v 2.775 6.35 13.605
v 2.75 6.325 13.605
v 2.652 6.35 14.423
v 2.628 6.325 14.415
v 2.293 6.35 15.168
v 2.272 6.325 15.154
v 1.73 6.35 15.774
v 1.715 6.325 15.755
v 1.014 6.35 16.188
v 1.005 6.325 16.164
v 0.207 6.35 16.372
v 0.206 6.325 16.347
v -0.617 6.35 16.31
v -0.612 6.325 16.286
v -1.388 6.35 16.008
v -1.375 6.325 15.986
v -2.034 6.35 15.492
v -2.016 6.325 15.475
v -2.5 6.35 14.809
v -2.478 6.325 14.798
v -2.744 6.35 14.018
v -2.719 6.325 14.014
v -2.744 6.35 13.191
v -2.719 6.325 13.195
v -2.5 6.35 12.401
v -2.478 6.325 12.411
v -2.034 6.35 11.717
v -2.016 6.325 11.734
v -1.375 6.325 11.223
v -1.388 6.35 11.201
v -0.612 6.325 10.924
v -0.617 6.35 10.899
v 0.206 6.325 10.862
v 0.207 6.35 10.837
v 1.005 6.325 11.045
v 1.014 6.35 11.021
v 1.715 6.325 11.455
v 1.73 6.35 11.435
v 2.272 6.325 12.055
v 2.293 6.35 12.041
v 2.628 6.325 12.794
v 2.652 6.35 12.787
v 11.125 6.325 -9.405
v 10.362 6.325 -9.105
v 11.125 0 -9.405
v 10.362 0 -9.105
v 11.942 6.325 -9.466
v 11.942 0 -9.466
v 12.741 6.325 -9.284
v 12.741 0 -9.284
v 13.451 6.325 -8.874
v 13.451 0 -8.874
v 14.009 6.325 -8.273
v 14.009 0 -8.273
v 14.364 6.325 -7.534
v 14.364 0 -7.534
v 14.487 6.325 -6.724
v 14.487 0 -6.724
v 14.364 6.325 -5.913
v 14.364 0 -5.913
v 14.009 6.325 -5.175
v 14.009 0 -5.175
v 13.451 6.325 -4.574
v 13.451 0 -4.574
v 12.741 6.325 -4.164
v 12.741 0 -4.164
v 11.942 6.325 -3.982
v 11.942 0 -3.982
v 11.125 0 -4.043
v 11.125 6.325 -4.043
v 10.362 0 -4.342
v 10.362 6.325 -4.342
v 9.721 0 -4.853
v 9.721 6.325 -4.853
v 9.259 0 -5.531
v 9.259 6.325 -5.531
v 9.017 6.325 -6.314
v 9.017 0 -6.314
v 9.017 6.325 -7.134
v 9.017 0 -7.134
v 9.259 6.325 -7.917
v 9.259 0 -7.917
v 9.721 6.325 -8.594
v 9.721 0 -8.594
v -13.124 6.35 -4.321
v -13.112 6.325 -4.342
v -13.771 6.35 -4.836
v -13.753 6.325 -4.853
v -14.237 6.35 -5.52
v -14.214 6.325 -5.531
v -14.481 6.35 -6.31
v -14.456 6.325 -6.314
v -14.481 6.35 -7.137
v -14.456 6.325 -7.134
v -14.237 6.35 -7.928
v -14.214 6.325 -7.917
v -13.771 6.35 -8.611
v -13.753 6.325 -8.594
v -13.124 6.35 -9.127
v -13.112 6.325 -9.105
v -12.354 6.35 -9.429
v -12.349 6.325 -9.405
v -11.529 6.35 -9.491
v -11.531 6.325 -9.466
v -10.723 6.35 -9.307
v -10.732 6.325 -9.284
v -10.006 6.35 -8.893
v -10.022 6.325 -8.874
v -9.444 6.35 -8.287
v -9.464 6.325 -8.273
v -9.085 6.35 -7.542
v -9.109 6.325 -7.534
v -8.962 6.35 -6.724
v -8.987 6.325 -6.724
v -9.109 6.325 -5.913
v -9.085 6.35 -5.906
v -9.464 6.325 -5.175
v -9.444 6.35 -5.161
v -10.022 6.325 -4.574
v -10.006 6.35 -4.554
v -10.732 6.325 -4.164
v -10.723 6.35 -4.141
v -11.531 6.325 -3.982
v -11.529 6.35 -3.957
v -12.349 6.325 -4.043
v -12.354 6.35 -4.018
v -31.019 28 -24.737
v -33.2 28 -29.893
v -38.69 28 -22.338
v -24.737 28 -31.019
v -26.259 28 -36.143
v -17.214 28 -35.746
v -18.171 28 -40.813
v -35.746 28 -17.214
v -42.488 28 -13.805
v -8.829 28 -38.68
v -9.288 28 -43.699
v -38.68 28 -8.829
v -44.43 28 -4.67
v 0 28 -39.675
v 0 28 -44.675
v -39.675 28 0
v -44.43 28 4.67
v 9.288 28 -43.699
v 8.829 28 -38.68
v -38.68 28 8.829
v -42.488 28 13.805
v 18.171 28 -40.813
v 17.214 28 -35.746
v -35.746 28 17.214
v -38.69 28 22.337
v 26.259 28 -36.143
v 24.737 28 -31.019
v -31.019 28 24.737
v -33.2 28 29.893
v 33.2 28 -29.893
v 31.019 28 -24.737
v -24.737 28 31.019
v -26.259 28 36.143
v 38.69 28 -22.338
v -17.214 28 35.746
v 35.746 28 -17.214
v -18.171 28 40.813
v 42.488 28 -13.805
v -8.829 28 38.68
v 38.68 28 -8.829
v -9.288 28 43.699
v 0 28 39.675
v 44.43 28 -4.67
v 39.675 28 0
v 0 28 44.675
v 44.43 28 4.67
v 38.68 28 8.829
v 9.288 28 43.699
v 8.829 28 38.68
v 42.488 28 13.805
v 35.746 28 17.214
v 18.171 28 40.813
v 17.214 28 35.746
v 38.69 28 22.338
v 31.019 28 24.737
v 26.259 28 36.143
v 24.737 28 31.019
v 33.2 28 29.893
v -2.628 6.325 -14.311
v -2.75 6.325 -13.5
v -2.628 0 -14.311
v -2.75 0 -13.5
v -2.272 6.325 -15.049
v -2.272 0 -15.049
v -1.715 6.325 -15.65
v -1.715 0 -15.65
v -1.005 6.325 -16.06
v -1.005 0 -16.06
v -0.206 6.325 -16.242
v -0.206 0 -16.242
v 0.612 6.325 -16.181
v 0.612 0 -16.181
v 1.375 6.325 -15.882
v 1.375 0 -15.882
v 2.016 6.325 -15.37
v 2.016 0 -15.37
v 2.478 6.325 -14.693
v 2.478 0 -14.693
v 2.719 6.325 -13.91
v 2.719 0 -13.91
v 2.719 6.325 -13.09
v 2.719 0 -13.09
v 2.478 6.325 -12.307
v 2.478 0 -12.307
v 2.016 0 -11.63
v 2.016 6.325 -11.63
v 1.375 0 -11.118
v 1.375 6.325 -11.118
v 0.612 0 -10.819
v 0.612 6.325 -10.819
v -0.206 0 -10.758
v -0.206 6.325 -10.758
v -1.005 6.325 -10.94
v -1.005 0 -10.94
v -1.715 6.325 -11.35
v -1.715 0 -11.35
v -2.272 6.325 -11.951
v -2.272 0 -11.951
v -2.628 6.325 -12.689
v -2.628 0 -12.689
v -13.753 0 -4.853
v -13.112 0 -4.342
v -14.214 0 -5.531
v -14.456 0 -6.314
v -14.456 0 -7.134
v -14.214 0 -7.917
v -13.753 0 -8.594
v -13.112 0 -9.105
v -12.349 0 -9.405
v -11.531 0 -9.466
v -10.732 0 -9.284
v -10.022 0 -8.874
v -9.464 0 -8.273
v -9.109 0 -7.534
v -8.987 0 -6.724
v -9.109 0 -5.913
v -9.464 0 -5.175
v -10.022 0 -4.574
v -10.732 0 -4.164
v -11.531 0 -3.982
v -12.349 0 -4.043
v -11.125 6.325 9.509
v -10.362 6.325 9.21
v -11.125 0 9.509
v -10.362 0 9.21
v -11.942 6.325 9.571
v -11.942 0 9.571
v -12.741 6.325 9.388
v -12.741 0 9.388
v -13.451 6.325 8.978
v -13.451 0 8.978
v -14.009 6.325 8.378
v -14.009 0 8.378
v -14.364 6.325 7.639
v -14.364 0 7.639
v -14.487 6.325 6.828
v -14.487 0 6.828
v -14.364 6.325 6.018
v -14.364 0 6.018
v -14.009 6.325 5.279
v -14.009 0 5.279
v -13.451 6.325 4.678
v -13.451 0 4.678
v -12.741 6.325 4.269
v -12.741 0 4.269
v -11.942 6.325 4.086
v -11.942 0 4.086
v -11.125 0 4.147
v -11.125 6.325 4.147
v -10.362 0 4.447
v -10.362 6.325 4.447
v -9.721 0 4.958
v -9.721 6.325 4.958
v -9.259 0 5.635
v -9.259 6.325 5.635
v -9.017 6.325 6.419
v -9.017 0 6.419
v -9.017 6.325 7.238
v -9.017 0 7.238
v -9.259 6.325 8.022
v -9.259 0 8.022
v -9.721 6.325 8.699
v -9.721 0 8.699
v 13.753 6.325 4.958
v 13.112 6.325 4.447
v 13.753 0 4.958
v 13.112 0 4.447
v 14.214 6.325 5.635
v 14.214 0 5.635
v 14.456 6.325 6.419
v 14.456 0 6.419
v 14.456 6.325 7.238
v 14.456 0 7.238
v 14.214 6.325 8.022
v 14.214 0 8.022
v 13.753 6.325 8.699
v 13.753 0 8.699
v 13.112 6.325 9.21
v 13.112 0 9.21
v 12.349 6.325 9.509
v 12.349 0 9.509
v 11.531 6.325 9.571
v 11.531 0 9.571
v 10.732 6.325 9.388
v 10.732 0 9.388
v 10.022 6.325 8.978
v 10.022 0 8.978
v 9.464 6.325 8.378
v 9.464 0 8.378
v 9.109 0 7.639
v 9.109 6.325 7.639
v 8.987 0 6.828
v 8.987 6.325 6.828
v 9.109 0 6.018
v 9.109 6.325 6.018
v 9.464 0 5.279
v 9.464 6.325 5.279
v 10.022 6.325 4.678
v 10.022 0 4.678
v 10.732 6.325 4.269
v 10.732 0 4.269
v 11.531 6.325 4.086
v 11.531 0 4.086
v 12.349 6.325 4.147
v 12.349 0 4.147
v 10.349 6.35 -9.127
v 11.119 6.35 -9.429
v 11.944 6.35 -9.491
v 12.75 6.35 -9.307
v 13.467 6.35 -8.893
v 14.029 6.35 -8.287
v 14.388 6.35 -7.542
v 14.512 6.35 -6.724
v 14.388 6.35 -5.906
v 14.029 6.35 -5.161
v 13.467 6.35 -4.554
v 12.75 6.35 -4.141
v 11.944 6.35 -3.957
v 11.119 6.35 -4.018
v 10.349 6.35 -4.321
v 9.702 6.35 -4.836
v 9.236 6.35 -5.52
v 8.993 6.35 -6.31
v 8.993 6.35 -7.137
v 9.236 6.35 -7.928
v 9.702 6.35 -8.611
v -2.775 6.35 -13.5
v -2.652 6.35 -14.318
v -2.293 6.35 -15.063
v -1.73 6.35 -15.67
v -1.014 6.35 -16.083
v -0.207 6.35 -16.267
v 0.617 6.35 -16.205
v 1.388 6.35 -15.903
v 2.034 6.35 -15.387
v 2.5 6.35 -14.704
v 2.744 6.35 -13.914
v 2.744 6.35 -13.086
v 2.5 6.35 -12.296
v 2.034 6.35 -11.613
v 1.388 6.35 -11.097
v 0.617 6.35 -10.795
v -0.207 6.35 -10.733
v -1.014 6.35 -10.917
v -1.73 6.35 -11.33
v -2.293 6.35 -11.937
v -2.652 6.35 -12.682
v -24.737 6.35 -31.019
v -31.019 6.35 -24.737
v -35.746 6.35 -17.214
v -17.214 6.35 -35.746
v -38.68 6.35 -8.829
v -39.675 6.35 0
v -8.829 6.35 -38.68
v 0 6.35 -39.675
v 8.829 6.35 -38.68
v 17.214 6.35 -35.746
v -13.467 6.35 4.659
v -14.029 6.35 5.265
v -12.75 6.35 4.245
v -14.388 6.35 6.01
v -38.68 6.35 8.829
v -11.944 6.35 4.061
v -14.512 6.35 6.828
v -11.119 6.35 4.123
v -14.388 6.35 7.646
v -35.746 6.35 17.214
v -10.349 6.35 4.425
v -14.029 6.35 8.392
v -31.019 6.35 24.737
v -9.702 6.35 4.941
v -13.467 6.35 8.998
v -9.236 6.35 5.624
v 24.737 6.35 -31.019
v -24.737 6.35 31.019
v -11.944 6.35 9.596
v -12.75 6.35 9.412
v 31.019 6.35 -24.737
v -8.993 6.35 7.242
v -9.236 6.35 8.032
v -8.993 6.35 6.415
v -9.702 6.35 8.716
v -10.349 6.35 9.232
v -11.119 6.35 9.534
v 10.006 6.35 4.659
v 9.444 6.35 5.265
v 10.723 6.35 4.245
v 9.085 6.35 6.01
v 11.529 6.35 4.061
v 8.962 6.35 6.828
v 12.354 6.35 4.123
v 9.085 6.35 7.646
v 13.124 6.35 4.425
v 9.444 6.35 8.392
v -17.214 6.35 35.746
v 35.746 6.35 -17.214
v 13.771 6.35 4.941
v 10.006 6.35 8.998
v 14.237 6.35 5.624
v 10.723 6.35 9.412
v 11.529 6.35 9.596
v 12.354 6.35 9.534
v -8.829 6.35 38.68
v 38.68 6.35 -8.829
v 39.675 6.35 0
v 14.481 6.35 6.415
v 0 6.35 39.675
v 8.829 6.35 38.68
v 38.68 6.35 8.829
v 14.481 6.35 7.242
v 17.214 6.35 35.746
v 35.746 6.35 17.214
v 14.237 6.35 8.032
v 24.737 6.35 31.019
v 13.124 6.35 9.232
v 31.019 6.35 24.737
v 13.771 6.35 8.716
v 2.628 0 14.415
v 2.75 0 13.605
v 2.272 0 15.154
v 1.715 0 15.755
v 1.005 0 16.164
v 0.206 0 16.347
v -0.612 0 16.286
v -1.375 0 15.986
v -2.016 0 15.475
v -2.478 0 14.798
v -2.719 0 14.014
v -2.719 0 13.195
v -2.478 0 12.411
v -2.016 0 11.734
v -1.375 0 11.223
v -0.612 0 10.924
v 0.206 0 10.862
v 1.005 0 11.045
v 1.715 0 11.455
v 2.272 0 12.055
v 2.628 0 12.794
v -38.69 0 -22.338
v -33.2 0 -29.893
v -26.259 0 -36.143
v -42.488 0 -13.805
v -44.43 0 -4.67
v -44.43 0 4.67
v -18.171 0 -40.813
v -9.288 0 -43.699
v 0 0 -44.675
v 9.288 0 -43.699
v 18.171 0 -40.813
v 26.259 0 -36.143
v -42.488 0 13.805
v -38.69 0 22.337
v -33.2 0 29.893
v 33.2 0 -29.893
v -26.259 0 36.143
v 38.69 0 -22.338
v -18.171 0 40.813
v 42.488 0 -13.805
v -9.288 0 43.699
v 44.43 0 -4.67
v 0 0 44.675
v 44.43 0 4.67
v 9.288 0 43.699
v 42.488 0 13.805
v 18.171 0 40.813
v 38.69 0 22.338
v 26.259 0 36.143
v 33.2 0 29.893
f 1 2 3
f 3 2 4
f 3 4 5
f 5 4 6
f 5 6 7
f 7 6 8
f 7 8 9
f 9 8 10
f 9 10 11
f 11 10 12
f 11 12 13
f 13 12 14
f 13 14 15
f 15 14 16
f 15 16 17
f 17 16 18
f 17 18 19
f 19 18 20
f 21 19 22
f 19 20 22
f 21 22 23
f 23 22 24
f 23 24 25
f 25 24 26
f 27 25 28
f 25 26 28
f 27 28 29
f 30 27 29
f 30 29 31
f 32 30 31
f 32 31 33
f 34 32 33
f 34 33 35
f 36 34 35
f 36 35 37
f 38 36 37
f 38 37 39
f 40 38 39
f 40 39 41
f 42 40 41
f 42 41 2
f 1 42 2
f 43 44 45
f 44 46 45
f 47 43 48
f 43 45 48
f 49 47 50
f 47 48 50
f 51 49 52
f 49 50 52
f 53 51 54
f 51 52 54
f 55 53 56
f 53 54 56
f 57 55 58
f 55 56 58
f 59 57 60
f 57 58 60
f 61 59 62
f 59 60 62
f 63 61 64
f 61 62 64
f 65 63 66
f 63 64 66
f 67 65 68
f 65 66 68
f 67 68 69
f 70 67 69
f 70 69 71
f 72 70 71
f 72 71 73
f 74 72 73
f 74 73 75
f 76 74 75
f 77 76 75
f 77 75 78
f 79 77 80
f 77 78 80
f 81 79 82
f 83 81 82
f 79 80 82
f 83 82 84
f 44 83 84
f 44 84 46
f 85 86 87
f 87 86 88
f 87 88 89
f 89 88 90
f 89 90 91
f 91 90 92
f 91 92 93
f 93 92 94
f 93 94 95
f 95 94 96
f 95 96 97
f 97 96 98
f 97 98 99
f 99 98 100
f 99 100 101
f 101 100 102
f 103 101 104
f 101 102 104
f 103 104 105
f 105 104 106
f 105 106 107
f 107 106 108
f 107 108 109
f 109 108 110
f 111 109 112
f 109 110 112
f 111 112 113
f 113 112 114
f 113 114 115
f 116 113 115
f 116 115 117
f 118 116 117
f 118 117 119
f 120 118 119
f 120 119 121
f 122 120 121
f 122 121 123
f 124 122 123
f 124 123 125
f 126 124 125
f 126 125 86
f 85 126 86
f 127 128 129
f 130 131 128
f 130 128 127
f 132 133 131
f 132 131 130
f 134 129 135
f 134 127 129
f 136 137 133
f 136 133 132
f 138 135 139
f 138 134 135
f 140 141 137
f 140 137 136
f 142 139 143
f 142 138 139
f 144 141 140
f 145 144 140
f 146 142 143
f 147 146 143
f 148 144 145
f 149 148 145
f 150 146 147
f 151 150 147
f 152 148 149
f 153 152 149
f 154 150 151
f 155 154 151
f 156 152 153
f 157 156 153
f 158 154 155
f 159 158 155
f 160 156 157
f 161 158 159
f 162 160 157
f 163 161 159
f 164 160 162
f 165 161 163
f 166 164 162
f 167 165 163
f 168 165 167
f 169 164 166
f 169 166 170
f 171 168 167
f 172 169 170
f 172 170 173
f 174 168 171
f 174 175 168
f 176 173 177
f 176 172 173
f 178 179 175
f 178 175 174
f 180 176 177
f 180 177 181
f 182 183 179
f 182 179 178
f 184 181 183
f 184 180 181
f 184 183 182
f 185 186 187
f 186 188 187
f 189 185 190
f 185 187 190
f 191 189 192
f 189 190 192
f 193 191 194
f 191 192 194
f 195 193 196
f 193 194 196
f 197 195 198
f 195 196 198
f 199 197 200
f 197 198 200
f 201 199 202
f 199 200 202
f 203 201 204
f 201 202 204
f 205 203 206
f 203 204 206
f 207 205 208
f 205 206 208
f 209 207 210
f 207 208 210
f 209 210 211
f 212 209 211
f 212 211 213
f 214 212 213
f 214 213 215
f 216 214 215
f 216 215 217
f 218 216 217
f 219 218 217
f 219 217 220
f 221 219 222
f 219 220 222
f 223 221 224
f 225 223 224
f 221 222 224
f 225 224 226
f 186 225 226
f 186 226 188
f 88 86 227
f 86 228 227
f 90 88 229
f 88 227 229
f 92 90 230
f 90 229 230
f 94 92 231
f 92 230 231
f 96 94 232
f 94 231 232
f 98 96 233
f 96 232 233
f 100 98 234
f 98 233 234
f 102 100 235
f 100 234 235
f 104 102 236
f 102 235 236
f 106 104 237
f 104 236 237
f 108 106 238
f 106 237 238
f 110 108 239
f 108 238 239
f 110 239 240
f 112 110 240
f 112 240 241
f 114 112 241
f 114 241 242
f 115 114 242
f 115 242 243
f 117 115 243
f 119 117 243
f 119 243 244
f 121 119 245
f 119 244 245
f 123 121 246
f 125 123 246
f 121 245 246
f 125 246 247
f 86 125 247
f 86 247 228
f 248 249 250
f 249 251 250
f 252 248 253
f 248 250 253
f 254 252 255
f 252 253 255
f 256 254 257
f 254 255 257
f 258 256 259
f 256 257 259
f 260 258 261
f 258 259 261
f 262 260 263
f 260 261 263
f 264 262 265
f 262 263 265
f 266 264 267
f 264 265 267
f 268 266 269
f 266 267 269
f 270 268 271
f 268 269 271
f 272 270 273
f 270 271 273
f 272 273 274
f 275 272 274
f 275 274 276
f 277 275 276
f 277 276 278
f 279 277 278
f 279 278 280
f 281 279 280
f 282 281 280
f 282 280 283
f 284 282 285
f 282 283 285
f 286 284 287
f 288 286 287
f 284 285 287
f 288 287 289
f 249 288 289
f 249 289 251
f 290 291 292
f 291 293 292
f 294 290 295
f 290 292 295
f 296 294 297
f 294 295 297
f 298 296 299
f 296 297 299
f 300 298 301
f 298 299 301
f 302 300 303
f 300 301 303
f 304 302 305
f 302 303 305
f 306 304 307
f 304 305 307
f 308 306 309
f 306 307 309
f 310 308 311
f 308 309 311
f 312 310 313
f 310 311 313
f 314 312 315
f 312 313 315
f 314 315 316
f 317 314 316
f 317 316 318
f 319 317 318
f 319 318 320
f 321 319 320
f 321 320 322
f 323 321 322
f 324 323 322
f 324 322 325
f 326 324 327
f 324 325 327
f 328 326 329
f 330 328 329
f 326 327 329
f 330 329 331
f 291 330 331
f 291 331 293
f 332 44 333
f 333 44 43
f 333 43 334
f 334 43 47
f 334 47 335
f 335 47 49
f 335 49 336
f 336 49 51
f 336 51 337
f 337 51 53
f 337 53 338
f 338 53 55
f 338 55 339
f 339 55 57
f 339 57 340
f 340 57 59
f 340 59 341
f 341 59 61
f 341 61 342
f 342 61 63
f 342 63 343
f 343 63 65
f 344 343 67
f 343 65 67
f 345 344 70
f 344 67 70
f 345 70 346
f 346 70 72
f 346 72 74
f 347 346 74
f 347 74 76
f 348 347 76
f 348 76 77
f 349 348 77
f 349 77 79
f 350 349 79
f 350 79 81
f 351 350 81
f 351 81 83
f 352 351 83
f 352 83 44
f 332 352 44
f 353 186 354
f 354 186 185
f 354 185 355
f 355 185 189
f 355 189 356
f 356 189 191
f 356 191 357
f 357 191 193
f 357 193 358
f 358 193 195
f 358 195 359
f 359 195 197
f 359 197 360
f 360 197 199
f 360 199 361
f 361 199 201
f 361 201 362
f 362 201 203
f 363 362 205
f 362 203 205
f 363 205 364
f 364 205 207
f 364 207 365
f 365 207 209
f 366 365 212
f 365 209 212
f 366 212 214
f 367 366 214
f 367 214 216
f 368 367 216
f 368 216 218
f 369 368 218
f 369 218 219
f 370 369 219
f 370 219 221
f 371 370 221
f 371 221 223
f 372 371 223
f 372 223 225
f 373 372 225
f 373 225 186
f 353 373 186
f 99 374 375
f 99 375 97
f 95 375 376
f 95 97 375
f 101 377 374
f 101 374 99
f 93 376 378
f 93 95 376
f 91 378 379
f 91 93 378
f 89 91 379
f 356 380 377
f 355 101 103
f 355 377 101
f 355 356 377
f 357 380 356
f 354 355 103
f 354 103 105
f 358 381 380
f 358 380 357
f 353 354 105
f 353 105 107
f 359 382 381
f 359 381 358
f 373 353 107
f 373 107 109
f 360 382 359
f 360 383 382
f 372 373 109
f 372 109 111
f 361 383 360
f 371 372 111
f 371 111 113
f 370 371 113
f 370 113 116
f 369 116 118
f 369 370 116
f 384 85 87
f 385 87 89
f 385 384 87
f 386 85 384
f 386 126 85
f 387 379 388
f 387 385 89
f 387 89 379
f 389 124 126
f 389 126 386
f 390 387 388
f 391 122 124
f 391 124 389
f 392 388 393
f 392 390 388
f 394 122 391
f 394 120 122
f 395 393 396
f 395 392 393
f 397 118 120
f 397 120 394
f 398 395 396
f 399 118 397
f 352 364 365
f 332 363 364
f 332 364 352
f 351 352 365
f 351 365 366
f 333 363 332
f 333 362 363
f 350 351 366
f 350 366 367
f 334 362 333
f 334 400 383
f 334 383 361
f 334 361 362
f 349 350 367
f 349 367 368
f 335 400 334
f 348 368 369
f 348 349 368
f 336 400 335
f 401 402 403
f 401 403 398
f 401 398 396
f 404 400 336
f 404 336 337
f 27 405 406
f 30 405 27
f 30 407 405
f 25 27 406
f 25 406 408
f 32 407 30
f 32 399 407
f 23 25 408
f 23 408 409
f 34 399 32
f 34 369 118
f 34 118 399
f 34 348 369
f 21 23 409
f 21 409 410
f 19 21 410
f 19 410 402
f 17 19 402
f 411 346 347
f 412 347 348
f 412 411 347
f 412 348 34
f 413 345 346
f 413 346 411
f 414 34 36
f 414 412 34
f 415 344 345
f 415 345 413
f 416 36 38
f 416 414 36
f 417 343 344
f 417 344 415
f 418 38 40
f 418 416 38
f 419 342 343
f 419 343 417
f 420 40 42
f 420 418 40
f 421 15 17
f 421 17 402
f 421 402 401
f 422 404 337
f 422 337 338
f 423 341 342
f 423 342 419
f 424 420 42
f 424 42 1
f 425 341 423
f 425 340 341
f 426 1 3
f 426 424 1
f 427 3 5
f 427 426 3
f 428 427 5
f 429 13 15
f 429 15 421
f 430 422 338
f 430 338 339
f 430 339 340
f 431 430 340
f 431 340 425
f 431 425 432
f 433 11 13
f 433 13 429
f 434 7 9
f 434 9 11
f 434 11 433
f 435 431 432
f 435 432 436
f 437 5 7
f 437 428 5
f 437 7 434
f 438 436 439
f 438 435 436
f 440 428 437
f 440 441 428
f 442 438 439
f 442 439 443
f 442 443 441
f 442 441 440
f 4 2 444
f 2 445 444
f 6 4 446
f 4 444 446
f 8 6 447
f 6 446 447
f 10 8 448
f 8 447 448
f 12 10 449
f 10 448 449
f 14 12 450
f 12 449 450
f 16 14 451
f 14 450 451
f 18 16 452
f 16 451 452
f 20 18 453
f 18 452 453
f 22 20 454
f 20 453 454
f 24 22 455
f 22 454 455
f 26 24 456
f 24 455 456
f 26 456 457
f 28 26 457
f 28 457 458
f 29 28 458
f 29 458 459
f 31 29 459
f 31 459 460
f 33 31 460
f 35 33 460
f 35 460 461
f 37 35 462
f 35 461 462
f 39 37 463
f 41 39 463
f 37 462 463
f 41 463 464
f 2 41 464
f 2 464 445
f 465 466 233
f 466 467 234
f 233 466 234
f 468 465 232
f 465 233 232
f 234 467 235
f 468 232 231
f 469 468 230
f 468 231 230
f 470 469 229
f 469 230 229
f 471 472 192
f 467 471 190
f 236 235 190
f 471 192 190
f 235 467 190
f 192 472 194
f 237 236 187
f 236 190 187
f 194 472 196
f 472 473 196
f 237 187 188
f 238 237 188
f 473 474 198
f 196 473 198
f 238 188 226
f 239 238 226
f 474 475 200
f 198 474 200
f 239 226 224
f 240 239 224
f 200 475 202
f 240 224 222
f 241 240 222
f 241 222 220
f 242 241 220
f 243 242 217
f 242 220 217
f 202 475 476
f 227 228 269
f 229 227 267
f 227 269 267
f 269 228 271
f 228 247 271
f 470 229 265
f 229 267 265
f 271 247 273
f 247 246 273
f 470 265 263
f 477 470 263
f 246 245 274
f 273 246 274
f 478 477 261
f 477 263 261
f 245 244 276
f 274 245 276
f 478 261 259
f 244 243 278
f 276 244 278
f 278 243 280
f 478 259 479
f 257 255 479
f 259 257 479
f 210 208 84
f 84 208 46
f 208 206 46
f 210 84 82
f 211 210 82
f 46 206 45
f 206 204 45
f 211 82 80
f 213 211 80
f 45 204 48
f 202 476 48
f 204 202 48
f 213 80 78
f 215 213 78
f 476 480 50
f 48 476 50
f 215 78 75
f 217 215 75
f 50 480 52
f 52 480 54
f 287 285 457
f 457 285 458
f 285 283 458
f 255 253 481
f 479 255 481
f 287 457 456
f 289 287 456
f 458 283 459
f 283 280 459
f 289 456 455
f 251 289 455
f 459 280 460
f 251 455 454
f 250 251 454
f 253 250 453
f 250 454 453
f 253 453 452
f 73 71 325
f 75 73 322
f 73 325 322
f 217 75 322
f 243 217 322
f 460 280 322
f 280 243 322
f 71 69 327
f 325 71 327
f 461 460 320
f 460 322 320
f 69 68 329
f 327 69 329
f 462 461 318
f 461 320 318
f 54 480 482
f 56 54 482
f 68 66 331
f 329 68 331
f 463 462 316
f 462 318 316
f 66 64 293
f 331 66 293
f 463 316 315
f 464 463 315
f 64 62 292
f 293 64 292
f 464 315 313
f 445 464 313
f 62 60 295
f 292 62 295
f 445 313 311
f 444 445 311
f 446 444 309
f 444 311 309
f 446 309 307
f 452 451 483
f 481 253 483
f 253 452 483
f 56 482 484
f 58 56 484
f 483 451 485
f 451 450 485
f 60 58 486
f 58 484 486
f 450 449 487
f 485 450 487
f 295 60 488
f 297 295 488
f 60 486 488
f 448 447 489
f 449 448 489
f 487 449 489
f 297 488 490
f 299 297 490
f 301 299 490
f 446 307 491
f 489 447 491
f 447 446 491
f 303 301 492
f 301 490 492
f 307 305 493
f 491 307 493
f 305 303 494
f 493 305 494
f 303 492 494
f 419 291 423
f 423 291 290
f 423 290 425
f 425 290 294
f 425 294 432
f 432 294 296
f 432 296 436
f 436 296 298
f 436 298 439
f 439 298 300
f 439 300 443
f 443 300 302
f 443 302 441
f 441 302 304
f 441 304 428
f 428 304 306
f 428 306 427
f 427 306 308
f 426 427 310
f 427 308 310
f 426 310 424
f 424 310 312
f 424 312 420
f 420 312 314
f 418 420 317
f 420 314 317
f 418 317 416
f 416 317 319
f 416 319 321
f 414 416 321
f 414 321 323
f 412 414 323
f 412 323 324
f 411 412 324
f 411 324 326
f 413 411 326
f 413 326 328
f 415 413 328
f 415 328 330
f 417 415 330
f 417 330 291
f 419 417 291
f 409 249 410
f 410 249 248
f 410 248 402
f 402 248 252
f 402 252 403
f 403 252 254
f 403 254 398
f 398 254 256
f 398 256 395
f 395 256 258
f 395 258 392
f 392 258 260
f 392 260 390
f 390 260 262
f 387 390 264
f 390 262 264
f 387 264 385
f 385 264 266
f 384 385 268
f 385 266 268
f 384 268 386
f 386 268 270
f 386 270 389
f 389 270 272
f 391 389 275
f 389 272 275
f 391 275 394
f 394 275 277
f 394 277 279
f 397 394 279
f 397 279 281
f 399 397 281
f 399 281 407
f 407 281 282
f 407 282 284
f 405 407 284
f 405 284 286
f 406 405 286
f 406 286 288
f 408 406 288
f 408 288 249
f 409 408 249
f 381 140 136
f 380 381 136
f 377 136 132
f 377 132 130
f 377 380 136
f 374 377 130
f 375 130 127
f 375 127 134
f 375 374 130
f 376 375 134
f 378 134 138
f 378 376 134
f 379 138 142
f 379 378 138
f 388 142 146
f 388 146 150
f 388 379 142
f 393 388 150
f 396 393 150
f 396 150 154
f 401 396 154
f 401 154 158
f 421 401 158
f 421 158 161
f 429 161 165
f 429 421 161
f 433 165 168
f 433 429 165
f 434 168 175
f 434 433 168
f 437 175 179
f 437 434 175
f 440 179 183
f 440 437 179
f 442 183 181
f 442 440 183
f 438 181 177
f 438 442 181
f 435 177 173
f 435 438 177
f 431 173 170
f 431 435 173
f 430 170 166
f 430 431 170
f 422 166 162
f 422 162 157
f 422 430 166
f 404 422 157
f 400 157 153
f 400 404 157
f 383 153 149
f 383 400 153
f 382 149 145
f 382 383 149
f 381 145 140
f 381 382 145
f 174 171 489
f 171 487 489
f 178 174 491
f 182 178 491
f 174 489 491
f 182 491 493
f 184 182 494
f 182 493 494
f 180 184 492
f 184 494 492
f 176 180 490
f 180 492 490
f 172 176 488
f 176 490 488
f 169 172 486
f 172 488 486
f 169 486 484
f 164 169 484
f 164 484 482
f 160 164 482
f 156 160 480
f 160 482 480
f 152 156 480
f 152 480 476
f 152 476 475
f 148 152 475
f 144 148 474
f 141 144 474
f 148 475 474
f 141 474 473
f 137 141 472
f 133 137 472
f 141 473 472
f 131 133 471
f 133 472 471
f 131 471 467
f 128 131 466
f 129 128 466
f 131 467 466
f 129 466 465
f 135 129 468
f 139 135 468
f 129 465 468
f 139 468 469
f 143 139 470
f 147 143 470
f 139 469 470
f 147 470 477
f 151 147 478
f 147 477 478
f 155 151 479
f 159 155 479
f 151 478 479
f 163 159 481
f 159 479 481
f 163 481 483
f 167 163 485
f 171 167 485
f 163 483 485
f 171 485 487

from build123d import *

# Parameters (mm, degrees)
SKETCH1_R                      = 44.675
BOSS_EXTRUDE2_DEPTH            = 6.35
M5_CLEARANCE_HOLE2_D           = 5.5
M5_CLEARANCE_HOLE2_CSINK_D     = 5.55
M5_CLEARANCE_HOLE2_CSINK_ANGLE = 90
CIRPATTERN1_COUNT              = 6
SKETCH13_R                     = 44.675
SKETCH13_R_2                   = 39.675
BOSS_EXTRUDE4_DEPTH            = 21.65


with BuildPart() as part:
    # Sketch1 → Boss-Extrude2 (new body)
    with BuildSketch(Plane(origin=(0, 0, 0), x_dir=(1, 0, 0), z_dir=(0, 1, 0))):
        with Locations(Location((0, 0, 0), (0, 0, 270))):
            Circle(SKETCH1_R)
    extrude(amount=BOSS_EXTRUDE2_DEPTH)

    # M5 Clearance Hole2 (through all)
    with Locations(Plane(origin=(0, 6.35, 0), x_dir=(1, 0, 0), z_dir=(0, 1, 0))):
        with Locations((0, 13.5)):
            m5_clearance_hole2 = CounterSinkHole(M5_CLEARANCE_HOLE2_D / 2, M5_CLEARANCE_HOLE2_CSINK_D / 2, counter_sink_angle=M5_CLEARANCE_HOLE2_CSINK_ANGLE)

    # CirPattern1: M5 Clearance Hole2 ×6 about axis
    cirpattern1_axis = Axis((0, 0, 0.0522889), (0, 1, 0))
    for i in range(1, CIRPATTERN1_COUNT):
        add(m5_clearance_hole2.rotate(cirpattern1_axis, i * 360 / CIRPATTERN1_COUNT), mode=Mode.SUBTRACT)

    # Sketch13 → Boss-Extrude4 (add)
    # profile 1 of 4: a face of its own
    with BuildSketch(Plane(origin=(0, 6.35, 0), x_dir=(1, 0, 0), z_dir=(0, 1, 0))):
        with Locations(Location((0, 0, 0), (0, 0, 270))):
            Circle(SKETCH13_R)
        with Locations(Location((0, 0, 0), (0, 0, 90))):
            Circle(SKETCH13_R_2, mode=Mode.SUBTRACT)
    # profile 2 of 4: a face of its own
    with BuildSketch(Plane(origin=(0, 6.35, 0), x_dir=(1, 0, 0), z_dir=(0, 1, 0))):
        with Locations(Location((0, 0, 0), (0, 0, 270))):
            Circle(SKETCH13_R)
        with Locations(Location((0, 0, 0), (0, 0, 90))):
            Circle(SKETCH13_R_2, mode=Mode.SUBTRACT)
    # profile 3 of 4: a face of its own
    with BuildSketch(Plane(origin=(0, 6.35, 0), x_dir=(1, 0, 0), z_dir=(0, 1, 0))):
        with Locations(Location((0, 0, 0), (0, 0, 270))):
            Circle(SKETCH13_R)
        with Locations(Location((0, 0, 0), (0, 0, 90))):
            Circle(SKETCH13_R_2, mode=Mode.SUBTRACT)
    # profile 4 of 4: a face of its own
    with BuildSketch(Plane(origin=(0, 6.35, 0), x_dir=(1, 0, 0), z_dir=(0, 1, 0))):
        with Locations(Location((0, 0, 0), (0, 0, 270))):
            Circle(SKETCH13_R)
        with Locations(Location((0, 0, 0), (0, 0, 90))):
            Circle(SKETCH13_R_2, mode=Mode.SUBTRACT)
    extrude(amount=BOSS_EXTRUDE4_DEPTH)


solid = part.part
